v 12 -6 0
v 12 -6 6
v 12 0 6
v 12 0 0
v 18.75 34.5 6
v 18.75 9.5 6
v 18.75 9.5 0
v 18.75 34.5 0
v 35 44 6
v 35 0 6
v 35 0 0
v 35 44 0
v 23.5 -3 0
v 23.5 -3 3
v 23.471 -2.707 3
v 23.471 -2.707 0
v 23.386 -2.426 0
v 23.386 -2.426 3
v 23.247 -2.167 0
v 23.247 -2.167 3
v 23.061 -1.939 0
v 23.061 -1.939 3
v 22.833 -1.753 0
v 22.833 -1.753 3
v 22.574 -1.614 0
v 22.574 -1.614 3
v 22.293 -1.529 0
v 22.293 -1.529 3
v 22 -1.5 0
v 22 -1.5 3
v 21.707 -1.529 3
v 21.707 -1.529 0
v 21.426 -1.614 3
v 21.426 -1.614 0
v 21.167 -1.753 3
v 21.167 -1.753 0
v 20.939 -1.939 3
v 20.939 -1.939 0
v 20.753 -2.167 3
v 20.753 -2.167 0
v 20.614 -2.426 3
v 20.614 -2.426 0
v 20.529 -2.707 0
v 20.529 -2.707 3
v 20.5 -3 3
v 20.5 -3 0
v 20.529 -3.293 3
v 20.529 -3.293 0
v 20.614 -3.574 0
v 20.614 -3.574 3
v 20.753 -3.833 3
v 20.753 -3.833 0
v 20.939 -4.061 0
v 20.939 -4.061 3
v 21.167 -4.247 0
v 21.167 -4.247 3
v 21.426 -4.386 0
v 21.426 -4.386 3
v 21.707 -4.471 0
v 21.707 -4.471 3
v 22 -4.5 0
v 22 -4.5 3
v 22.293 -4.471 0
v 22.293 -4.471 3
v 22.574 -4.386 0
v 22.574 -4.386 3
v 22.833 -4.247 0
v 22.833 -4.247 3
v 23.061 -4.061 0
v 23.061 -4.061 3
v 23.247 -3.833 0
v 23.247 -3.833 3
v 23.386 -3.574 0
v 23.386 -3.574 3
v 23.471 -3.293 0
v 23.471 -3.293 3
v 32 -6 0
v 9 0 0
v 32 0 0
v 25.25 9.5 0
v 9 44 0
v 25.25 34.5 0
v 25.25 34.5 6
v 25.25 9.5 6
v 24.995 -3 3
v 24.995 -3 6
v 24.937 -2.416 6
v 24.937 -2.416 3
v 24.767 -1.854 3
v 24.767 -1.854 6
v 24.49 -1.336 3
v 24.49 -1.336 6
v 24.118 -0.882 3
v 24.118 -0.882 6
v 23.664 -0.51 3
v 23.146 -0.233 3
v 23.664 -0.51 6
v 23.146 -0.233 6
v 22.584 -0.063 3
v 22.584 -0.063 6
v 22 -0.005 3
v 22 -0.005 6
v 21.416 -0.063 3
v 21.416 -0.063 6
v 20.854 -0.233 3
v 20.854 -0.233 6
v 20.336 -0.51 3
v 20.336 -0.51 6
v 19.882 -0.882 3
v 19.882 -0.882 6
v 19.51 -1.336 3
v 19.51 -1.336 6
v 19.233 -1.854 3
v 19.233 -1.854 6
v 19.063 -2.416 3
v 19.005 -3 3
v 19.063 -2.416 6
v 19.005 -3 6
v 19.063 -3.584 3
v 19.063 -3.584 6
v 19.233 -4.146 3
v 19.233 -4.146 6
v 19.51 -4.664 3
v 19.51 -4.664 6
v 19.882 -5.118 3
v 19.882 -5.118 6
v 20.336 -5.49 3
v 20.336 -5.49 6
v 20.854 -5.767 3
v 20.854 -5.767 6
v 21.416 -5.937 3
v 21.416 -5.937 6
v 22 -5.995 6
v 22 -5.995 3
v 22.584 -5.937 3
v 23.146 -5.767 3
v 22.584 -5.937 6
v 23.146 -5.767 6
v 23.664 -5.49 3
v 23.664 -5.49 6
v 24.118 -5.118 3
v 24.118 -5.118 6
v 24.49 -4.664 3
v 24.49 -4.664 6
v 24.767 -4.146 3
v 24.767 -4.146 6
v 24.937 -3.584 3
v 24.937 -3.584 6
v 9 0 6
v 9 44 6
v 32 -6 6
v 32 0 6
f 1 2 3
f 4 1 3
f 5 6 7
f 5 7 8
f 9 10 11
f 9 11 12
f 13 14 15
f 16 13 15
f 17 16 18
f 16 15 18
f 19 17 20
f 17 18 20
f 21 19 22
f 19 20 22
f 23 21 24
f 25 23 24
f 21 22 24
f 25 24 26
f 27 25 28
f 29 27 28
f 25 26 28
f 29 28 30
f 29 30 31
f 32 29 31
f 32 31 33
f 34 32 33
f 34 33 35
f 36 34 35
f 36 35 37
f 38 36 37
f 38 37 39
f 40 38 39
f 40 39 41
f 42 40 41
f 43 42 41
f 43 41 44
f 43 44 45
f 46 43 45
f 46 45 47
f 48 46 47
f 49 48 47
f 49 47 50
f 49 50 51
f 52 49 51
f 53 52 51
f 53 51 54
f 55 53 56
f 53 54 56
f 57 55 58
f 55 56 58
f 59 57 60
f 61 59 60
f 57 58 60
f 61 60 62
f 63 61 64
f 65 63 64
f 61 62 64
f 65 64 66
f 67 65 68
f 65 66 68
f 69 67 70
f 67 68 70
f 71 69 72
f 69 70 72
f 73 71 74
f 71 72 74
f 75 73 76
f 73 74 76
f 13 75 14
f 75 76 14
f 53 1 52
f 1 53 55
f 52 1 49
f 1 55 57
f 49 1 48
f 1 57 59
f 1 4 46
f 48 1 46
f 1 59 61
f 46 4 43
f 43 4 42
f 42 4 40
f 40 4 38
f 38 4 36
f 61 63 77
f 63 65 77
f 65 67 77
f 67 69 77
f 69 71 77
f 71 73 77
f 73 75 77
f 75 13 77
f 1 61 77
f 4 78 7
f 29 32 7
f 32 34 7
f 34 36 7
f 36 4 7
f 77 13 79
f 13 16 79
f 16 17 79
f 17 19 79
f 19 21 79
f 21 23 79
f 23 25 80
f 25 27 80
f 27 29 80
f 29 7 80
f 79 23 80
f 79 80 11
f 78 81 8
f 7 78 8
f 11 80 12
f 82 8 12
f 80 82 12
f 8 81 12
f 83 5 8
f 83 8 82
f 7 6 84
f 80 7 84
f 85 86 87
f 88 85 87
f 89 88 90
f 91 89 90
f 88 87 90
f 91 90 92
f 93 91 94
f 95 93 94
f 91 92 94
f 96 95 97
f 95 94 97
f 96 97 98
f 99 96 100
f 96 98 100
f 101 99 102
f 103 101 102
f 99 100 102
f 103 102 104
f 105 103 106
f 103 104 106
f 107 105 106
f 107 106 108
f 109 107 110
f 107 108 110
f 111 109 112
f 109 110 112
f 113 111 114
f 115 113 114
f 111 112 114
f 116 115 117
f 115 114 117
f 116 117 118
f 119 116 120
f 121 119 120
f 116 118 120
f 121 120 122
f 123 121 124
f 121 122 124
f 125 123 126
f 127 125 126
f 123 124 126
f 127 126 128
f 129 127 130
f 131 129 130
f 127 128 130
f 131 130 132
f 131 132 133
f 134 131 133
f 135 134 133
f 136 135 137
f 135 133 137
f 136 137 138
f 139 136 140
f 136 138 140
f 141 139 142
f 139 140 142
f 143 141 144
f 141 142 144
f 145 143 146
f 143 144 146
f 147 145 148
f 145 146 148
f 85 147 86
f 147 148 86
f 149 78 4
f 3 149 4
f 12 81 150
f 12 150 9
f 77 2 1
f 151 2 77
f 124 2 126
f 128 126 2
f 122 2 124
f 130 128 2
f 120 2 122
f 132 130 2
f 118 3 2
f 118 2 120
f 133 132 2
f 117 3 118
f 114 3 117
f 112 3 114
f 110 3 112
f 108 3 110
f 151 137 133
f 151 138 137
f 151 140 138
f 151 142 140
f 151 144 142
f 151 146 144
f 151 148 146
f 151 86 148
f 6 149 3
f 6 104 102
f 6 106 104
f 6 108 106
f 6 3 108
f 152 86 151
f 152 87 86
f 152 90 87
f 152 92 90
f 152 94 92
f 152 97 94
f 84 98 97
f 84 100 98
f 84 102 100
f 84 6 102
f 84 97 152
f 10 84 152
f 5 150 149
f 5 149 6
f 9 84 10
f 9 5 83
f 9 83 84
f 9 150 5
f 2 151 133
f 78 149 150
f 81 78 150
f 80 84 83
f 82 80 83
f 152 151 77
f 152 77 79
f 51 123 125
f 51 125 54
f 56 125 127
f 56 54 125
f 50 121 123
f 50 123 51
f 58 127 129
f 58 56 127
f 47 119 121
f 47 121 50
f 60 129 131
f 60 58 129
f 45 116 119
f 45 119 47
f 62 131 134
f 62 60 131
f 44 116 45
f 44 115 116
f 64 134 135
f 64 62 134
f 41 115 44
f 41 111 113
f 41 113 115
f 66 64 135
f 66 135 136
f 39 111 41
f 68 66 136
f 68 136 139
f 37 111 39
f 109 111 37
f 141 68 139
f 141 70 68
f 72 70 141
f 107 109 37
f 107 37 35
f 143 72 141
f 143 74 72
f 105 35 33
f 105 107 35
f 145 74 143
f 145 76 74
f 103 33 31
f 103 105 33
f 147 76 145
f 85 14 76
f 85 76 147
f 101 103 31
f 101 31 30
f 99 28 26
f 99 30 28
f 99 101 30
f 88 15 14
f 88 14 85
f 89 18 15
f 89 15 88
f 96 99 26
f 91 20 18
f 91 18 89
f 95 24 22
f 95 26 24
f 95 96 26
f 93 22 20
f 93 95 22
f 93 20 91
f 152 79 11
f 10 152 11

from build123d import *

# Parameters (mm, degrees)
ESQUISSE1_W             = 44
ESQUISSE1_H             = 44
BOSS_EXTRU_1_DEPTH      = 6
ESQUISSE2_W             = 20
ESQUISSE2_H             = 6
BOSS_EXTRU_3_DEPTH      = 6
ESQUISSE3_W             = 6.5
ESQUISSE3_H             = 25
ENL_V_MAT_EXTRU_1_DEPTH = 6
ESQUISSE4_W             = 9
ESQUISSE4_H             = 44
ENL_V_MAT_EXTRU_2_DEPTH = 6
ESQUISSE5_R             = 1.5
ENL_V_MAT_EXTRU_3_DEPTH = 6
ESQUISSE6_R             = 2.995
ENL_V_MAT_EXTRU_4_DEPTH = 3


with BuildPart() as part:
    # Esquisse1 → Boss.-Extru.1 (new body)
    with BuildSketch(Plane.XY):
        with Locations((22, 22)):
            Rectangle(ESQUISSE1_W, ESQUISSE1_H)
    extrude(amount=BOSS_EXTRU_1_DEPTH)

    # Esquisse2 → Boss.-Extru.3 (add)
    with BuildSketch(Plane.XY.offset(6)):
        with Locations((22, -3)):
            Rectangle(ESQUISSE2_W, ESQUISSE2_H)
    extrude(amount=-BOSS_EXTRU_3_DEPTH)

    # Esquisse3 → Enlèv. mat.-Extru.1 (cut)
    with BuildSketch(Plane.XY.offset(6)):
        with Locations((22, 22)):
            Rectangle(ESQUISSE3_W, ESQUISSE3_H)
    extrude(amount=-ENL_V_MAT_EXTRU_1_DEPTH, mode=Mode.SUBTRACT)

    # Esquisse4 → Enlèv. mat.-Extru.2 (cut)
    with BuildSketch(Plane.XY.offset(6)):
        with Locations((4.5, 22)):
            Rectangle(ESQUISSE4_W, ESQUISSE4_H)
        with Locations((39.5, 22)):
            Rectangle(ESQUISSE4_W, ESQUISSE4_H)
    extrude(amount=-ENL_V_MAT_EXTRU_2_DEPTH, mode=Mode.SUBTRACT)

    # Esquisse5 → Enlèv. mat.-Extru.3 (cut)
    with BuildSketch(Plane.XY.offset(6)):
        with Locations((22, -3)):
            Circle(ESQUISSE5_R)
    extrude(amount=-ENL_V_MAT_EXTRU_3_DEPTH, mode=Mode.SUBTRACT)

    # Esquisse6 → Enlèv. mat.-Extru.4 (cut)
    with BuildSketch(Plane.XY.offset(6)):
        with Locations((22, -3)):
            Circle(ESQUISSE6_R)
    extrude(amount=-ENL_V_MAT_EXTRU_4_DEPTH, mode=Mode.SUBTRACT)


solid = part.part
